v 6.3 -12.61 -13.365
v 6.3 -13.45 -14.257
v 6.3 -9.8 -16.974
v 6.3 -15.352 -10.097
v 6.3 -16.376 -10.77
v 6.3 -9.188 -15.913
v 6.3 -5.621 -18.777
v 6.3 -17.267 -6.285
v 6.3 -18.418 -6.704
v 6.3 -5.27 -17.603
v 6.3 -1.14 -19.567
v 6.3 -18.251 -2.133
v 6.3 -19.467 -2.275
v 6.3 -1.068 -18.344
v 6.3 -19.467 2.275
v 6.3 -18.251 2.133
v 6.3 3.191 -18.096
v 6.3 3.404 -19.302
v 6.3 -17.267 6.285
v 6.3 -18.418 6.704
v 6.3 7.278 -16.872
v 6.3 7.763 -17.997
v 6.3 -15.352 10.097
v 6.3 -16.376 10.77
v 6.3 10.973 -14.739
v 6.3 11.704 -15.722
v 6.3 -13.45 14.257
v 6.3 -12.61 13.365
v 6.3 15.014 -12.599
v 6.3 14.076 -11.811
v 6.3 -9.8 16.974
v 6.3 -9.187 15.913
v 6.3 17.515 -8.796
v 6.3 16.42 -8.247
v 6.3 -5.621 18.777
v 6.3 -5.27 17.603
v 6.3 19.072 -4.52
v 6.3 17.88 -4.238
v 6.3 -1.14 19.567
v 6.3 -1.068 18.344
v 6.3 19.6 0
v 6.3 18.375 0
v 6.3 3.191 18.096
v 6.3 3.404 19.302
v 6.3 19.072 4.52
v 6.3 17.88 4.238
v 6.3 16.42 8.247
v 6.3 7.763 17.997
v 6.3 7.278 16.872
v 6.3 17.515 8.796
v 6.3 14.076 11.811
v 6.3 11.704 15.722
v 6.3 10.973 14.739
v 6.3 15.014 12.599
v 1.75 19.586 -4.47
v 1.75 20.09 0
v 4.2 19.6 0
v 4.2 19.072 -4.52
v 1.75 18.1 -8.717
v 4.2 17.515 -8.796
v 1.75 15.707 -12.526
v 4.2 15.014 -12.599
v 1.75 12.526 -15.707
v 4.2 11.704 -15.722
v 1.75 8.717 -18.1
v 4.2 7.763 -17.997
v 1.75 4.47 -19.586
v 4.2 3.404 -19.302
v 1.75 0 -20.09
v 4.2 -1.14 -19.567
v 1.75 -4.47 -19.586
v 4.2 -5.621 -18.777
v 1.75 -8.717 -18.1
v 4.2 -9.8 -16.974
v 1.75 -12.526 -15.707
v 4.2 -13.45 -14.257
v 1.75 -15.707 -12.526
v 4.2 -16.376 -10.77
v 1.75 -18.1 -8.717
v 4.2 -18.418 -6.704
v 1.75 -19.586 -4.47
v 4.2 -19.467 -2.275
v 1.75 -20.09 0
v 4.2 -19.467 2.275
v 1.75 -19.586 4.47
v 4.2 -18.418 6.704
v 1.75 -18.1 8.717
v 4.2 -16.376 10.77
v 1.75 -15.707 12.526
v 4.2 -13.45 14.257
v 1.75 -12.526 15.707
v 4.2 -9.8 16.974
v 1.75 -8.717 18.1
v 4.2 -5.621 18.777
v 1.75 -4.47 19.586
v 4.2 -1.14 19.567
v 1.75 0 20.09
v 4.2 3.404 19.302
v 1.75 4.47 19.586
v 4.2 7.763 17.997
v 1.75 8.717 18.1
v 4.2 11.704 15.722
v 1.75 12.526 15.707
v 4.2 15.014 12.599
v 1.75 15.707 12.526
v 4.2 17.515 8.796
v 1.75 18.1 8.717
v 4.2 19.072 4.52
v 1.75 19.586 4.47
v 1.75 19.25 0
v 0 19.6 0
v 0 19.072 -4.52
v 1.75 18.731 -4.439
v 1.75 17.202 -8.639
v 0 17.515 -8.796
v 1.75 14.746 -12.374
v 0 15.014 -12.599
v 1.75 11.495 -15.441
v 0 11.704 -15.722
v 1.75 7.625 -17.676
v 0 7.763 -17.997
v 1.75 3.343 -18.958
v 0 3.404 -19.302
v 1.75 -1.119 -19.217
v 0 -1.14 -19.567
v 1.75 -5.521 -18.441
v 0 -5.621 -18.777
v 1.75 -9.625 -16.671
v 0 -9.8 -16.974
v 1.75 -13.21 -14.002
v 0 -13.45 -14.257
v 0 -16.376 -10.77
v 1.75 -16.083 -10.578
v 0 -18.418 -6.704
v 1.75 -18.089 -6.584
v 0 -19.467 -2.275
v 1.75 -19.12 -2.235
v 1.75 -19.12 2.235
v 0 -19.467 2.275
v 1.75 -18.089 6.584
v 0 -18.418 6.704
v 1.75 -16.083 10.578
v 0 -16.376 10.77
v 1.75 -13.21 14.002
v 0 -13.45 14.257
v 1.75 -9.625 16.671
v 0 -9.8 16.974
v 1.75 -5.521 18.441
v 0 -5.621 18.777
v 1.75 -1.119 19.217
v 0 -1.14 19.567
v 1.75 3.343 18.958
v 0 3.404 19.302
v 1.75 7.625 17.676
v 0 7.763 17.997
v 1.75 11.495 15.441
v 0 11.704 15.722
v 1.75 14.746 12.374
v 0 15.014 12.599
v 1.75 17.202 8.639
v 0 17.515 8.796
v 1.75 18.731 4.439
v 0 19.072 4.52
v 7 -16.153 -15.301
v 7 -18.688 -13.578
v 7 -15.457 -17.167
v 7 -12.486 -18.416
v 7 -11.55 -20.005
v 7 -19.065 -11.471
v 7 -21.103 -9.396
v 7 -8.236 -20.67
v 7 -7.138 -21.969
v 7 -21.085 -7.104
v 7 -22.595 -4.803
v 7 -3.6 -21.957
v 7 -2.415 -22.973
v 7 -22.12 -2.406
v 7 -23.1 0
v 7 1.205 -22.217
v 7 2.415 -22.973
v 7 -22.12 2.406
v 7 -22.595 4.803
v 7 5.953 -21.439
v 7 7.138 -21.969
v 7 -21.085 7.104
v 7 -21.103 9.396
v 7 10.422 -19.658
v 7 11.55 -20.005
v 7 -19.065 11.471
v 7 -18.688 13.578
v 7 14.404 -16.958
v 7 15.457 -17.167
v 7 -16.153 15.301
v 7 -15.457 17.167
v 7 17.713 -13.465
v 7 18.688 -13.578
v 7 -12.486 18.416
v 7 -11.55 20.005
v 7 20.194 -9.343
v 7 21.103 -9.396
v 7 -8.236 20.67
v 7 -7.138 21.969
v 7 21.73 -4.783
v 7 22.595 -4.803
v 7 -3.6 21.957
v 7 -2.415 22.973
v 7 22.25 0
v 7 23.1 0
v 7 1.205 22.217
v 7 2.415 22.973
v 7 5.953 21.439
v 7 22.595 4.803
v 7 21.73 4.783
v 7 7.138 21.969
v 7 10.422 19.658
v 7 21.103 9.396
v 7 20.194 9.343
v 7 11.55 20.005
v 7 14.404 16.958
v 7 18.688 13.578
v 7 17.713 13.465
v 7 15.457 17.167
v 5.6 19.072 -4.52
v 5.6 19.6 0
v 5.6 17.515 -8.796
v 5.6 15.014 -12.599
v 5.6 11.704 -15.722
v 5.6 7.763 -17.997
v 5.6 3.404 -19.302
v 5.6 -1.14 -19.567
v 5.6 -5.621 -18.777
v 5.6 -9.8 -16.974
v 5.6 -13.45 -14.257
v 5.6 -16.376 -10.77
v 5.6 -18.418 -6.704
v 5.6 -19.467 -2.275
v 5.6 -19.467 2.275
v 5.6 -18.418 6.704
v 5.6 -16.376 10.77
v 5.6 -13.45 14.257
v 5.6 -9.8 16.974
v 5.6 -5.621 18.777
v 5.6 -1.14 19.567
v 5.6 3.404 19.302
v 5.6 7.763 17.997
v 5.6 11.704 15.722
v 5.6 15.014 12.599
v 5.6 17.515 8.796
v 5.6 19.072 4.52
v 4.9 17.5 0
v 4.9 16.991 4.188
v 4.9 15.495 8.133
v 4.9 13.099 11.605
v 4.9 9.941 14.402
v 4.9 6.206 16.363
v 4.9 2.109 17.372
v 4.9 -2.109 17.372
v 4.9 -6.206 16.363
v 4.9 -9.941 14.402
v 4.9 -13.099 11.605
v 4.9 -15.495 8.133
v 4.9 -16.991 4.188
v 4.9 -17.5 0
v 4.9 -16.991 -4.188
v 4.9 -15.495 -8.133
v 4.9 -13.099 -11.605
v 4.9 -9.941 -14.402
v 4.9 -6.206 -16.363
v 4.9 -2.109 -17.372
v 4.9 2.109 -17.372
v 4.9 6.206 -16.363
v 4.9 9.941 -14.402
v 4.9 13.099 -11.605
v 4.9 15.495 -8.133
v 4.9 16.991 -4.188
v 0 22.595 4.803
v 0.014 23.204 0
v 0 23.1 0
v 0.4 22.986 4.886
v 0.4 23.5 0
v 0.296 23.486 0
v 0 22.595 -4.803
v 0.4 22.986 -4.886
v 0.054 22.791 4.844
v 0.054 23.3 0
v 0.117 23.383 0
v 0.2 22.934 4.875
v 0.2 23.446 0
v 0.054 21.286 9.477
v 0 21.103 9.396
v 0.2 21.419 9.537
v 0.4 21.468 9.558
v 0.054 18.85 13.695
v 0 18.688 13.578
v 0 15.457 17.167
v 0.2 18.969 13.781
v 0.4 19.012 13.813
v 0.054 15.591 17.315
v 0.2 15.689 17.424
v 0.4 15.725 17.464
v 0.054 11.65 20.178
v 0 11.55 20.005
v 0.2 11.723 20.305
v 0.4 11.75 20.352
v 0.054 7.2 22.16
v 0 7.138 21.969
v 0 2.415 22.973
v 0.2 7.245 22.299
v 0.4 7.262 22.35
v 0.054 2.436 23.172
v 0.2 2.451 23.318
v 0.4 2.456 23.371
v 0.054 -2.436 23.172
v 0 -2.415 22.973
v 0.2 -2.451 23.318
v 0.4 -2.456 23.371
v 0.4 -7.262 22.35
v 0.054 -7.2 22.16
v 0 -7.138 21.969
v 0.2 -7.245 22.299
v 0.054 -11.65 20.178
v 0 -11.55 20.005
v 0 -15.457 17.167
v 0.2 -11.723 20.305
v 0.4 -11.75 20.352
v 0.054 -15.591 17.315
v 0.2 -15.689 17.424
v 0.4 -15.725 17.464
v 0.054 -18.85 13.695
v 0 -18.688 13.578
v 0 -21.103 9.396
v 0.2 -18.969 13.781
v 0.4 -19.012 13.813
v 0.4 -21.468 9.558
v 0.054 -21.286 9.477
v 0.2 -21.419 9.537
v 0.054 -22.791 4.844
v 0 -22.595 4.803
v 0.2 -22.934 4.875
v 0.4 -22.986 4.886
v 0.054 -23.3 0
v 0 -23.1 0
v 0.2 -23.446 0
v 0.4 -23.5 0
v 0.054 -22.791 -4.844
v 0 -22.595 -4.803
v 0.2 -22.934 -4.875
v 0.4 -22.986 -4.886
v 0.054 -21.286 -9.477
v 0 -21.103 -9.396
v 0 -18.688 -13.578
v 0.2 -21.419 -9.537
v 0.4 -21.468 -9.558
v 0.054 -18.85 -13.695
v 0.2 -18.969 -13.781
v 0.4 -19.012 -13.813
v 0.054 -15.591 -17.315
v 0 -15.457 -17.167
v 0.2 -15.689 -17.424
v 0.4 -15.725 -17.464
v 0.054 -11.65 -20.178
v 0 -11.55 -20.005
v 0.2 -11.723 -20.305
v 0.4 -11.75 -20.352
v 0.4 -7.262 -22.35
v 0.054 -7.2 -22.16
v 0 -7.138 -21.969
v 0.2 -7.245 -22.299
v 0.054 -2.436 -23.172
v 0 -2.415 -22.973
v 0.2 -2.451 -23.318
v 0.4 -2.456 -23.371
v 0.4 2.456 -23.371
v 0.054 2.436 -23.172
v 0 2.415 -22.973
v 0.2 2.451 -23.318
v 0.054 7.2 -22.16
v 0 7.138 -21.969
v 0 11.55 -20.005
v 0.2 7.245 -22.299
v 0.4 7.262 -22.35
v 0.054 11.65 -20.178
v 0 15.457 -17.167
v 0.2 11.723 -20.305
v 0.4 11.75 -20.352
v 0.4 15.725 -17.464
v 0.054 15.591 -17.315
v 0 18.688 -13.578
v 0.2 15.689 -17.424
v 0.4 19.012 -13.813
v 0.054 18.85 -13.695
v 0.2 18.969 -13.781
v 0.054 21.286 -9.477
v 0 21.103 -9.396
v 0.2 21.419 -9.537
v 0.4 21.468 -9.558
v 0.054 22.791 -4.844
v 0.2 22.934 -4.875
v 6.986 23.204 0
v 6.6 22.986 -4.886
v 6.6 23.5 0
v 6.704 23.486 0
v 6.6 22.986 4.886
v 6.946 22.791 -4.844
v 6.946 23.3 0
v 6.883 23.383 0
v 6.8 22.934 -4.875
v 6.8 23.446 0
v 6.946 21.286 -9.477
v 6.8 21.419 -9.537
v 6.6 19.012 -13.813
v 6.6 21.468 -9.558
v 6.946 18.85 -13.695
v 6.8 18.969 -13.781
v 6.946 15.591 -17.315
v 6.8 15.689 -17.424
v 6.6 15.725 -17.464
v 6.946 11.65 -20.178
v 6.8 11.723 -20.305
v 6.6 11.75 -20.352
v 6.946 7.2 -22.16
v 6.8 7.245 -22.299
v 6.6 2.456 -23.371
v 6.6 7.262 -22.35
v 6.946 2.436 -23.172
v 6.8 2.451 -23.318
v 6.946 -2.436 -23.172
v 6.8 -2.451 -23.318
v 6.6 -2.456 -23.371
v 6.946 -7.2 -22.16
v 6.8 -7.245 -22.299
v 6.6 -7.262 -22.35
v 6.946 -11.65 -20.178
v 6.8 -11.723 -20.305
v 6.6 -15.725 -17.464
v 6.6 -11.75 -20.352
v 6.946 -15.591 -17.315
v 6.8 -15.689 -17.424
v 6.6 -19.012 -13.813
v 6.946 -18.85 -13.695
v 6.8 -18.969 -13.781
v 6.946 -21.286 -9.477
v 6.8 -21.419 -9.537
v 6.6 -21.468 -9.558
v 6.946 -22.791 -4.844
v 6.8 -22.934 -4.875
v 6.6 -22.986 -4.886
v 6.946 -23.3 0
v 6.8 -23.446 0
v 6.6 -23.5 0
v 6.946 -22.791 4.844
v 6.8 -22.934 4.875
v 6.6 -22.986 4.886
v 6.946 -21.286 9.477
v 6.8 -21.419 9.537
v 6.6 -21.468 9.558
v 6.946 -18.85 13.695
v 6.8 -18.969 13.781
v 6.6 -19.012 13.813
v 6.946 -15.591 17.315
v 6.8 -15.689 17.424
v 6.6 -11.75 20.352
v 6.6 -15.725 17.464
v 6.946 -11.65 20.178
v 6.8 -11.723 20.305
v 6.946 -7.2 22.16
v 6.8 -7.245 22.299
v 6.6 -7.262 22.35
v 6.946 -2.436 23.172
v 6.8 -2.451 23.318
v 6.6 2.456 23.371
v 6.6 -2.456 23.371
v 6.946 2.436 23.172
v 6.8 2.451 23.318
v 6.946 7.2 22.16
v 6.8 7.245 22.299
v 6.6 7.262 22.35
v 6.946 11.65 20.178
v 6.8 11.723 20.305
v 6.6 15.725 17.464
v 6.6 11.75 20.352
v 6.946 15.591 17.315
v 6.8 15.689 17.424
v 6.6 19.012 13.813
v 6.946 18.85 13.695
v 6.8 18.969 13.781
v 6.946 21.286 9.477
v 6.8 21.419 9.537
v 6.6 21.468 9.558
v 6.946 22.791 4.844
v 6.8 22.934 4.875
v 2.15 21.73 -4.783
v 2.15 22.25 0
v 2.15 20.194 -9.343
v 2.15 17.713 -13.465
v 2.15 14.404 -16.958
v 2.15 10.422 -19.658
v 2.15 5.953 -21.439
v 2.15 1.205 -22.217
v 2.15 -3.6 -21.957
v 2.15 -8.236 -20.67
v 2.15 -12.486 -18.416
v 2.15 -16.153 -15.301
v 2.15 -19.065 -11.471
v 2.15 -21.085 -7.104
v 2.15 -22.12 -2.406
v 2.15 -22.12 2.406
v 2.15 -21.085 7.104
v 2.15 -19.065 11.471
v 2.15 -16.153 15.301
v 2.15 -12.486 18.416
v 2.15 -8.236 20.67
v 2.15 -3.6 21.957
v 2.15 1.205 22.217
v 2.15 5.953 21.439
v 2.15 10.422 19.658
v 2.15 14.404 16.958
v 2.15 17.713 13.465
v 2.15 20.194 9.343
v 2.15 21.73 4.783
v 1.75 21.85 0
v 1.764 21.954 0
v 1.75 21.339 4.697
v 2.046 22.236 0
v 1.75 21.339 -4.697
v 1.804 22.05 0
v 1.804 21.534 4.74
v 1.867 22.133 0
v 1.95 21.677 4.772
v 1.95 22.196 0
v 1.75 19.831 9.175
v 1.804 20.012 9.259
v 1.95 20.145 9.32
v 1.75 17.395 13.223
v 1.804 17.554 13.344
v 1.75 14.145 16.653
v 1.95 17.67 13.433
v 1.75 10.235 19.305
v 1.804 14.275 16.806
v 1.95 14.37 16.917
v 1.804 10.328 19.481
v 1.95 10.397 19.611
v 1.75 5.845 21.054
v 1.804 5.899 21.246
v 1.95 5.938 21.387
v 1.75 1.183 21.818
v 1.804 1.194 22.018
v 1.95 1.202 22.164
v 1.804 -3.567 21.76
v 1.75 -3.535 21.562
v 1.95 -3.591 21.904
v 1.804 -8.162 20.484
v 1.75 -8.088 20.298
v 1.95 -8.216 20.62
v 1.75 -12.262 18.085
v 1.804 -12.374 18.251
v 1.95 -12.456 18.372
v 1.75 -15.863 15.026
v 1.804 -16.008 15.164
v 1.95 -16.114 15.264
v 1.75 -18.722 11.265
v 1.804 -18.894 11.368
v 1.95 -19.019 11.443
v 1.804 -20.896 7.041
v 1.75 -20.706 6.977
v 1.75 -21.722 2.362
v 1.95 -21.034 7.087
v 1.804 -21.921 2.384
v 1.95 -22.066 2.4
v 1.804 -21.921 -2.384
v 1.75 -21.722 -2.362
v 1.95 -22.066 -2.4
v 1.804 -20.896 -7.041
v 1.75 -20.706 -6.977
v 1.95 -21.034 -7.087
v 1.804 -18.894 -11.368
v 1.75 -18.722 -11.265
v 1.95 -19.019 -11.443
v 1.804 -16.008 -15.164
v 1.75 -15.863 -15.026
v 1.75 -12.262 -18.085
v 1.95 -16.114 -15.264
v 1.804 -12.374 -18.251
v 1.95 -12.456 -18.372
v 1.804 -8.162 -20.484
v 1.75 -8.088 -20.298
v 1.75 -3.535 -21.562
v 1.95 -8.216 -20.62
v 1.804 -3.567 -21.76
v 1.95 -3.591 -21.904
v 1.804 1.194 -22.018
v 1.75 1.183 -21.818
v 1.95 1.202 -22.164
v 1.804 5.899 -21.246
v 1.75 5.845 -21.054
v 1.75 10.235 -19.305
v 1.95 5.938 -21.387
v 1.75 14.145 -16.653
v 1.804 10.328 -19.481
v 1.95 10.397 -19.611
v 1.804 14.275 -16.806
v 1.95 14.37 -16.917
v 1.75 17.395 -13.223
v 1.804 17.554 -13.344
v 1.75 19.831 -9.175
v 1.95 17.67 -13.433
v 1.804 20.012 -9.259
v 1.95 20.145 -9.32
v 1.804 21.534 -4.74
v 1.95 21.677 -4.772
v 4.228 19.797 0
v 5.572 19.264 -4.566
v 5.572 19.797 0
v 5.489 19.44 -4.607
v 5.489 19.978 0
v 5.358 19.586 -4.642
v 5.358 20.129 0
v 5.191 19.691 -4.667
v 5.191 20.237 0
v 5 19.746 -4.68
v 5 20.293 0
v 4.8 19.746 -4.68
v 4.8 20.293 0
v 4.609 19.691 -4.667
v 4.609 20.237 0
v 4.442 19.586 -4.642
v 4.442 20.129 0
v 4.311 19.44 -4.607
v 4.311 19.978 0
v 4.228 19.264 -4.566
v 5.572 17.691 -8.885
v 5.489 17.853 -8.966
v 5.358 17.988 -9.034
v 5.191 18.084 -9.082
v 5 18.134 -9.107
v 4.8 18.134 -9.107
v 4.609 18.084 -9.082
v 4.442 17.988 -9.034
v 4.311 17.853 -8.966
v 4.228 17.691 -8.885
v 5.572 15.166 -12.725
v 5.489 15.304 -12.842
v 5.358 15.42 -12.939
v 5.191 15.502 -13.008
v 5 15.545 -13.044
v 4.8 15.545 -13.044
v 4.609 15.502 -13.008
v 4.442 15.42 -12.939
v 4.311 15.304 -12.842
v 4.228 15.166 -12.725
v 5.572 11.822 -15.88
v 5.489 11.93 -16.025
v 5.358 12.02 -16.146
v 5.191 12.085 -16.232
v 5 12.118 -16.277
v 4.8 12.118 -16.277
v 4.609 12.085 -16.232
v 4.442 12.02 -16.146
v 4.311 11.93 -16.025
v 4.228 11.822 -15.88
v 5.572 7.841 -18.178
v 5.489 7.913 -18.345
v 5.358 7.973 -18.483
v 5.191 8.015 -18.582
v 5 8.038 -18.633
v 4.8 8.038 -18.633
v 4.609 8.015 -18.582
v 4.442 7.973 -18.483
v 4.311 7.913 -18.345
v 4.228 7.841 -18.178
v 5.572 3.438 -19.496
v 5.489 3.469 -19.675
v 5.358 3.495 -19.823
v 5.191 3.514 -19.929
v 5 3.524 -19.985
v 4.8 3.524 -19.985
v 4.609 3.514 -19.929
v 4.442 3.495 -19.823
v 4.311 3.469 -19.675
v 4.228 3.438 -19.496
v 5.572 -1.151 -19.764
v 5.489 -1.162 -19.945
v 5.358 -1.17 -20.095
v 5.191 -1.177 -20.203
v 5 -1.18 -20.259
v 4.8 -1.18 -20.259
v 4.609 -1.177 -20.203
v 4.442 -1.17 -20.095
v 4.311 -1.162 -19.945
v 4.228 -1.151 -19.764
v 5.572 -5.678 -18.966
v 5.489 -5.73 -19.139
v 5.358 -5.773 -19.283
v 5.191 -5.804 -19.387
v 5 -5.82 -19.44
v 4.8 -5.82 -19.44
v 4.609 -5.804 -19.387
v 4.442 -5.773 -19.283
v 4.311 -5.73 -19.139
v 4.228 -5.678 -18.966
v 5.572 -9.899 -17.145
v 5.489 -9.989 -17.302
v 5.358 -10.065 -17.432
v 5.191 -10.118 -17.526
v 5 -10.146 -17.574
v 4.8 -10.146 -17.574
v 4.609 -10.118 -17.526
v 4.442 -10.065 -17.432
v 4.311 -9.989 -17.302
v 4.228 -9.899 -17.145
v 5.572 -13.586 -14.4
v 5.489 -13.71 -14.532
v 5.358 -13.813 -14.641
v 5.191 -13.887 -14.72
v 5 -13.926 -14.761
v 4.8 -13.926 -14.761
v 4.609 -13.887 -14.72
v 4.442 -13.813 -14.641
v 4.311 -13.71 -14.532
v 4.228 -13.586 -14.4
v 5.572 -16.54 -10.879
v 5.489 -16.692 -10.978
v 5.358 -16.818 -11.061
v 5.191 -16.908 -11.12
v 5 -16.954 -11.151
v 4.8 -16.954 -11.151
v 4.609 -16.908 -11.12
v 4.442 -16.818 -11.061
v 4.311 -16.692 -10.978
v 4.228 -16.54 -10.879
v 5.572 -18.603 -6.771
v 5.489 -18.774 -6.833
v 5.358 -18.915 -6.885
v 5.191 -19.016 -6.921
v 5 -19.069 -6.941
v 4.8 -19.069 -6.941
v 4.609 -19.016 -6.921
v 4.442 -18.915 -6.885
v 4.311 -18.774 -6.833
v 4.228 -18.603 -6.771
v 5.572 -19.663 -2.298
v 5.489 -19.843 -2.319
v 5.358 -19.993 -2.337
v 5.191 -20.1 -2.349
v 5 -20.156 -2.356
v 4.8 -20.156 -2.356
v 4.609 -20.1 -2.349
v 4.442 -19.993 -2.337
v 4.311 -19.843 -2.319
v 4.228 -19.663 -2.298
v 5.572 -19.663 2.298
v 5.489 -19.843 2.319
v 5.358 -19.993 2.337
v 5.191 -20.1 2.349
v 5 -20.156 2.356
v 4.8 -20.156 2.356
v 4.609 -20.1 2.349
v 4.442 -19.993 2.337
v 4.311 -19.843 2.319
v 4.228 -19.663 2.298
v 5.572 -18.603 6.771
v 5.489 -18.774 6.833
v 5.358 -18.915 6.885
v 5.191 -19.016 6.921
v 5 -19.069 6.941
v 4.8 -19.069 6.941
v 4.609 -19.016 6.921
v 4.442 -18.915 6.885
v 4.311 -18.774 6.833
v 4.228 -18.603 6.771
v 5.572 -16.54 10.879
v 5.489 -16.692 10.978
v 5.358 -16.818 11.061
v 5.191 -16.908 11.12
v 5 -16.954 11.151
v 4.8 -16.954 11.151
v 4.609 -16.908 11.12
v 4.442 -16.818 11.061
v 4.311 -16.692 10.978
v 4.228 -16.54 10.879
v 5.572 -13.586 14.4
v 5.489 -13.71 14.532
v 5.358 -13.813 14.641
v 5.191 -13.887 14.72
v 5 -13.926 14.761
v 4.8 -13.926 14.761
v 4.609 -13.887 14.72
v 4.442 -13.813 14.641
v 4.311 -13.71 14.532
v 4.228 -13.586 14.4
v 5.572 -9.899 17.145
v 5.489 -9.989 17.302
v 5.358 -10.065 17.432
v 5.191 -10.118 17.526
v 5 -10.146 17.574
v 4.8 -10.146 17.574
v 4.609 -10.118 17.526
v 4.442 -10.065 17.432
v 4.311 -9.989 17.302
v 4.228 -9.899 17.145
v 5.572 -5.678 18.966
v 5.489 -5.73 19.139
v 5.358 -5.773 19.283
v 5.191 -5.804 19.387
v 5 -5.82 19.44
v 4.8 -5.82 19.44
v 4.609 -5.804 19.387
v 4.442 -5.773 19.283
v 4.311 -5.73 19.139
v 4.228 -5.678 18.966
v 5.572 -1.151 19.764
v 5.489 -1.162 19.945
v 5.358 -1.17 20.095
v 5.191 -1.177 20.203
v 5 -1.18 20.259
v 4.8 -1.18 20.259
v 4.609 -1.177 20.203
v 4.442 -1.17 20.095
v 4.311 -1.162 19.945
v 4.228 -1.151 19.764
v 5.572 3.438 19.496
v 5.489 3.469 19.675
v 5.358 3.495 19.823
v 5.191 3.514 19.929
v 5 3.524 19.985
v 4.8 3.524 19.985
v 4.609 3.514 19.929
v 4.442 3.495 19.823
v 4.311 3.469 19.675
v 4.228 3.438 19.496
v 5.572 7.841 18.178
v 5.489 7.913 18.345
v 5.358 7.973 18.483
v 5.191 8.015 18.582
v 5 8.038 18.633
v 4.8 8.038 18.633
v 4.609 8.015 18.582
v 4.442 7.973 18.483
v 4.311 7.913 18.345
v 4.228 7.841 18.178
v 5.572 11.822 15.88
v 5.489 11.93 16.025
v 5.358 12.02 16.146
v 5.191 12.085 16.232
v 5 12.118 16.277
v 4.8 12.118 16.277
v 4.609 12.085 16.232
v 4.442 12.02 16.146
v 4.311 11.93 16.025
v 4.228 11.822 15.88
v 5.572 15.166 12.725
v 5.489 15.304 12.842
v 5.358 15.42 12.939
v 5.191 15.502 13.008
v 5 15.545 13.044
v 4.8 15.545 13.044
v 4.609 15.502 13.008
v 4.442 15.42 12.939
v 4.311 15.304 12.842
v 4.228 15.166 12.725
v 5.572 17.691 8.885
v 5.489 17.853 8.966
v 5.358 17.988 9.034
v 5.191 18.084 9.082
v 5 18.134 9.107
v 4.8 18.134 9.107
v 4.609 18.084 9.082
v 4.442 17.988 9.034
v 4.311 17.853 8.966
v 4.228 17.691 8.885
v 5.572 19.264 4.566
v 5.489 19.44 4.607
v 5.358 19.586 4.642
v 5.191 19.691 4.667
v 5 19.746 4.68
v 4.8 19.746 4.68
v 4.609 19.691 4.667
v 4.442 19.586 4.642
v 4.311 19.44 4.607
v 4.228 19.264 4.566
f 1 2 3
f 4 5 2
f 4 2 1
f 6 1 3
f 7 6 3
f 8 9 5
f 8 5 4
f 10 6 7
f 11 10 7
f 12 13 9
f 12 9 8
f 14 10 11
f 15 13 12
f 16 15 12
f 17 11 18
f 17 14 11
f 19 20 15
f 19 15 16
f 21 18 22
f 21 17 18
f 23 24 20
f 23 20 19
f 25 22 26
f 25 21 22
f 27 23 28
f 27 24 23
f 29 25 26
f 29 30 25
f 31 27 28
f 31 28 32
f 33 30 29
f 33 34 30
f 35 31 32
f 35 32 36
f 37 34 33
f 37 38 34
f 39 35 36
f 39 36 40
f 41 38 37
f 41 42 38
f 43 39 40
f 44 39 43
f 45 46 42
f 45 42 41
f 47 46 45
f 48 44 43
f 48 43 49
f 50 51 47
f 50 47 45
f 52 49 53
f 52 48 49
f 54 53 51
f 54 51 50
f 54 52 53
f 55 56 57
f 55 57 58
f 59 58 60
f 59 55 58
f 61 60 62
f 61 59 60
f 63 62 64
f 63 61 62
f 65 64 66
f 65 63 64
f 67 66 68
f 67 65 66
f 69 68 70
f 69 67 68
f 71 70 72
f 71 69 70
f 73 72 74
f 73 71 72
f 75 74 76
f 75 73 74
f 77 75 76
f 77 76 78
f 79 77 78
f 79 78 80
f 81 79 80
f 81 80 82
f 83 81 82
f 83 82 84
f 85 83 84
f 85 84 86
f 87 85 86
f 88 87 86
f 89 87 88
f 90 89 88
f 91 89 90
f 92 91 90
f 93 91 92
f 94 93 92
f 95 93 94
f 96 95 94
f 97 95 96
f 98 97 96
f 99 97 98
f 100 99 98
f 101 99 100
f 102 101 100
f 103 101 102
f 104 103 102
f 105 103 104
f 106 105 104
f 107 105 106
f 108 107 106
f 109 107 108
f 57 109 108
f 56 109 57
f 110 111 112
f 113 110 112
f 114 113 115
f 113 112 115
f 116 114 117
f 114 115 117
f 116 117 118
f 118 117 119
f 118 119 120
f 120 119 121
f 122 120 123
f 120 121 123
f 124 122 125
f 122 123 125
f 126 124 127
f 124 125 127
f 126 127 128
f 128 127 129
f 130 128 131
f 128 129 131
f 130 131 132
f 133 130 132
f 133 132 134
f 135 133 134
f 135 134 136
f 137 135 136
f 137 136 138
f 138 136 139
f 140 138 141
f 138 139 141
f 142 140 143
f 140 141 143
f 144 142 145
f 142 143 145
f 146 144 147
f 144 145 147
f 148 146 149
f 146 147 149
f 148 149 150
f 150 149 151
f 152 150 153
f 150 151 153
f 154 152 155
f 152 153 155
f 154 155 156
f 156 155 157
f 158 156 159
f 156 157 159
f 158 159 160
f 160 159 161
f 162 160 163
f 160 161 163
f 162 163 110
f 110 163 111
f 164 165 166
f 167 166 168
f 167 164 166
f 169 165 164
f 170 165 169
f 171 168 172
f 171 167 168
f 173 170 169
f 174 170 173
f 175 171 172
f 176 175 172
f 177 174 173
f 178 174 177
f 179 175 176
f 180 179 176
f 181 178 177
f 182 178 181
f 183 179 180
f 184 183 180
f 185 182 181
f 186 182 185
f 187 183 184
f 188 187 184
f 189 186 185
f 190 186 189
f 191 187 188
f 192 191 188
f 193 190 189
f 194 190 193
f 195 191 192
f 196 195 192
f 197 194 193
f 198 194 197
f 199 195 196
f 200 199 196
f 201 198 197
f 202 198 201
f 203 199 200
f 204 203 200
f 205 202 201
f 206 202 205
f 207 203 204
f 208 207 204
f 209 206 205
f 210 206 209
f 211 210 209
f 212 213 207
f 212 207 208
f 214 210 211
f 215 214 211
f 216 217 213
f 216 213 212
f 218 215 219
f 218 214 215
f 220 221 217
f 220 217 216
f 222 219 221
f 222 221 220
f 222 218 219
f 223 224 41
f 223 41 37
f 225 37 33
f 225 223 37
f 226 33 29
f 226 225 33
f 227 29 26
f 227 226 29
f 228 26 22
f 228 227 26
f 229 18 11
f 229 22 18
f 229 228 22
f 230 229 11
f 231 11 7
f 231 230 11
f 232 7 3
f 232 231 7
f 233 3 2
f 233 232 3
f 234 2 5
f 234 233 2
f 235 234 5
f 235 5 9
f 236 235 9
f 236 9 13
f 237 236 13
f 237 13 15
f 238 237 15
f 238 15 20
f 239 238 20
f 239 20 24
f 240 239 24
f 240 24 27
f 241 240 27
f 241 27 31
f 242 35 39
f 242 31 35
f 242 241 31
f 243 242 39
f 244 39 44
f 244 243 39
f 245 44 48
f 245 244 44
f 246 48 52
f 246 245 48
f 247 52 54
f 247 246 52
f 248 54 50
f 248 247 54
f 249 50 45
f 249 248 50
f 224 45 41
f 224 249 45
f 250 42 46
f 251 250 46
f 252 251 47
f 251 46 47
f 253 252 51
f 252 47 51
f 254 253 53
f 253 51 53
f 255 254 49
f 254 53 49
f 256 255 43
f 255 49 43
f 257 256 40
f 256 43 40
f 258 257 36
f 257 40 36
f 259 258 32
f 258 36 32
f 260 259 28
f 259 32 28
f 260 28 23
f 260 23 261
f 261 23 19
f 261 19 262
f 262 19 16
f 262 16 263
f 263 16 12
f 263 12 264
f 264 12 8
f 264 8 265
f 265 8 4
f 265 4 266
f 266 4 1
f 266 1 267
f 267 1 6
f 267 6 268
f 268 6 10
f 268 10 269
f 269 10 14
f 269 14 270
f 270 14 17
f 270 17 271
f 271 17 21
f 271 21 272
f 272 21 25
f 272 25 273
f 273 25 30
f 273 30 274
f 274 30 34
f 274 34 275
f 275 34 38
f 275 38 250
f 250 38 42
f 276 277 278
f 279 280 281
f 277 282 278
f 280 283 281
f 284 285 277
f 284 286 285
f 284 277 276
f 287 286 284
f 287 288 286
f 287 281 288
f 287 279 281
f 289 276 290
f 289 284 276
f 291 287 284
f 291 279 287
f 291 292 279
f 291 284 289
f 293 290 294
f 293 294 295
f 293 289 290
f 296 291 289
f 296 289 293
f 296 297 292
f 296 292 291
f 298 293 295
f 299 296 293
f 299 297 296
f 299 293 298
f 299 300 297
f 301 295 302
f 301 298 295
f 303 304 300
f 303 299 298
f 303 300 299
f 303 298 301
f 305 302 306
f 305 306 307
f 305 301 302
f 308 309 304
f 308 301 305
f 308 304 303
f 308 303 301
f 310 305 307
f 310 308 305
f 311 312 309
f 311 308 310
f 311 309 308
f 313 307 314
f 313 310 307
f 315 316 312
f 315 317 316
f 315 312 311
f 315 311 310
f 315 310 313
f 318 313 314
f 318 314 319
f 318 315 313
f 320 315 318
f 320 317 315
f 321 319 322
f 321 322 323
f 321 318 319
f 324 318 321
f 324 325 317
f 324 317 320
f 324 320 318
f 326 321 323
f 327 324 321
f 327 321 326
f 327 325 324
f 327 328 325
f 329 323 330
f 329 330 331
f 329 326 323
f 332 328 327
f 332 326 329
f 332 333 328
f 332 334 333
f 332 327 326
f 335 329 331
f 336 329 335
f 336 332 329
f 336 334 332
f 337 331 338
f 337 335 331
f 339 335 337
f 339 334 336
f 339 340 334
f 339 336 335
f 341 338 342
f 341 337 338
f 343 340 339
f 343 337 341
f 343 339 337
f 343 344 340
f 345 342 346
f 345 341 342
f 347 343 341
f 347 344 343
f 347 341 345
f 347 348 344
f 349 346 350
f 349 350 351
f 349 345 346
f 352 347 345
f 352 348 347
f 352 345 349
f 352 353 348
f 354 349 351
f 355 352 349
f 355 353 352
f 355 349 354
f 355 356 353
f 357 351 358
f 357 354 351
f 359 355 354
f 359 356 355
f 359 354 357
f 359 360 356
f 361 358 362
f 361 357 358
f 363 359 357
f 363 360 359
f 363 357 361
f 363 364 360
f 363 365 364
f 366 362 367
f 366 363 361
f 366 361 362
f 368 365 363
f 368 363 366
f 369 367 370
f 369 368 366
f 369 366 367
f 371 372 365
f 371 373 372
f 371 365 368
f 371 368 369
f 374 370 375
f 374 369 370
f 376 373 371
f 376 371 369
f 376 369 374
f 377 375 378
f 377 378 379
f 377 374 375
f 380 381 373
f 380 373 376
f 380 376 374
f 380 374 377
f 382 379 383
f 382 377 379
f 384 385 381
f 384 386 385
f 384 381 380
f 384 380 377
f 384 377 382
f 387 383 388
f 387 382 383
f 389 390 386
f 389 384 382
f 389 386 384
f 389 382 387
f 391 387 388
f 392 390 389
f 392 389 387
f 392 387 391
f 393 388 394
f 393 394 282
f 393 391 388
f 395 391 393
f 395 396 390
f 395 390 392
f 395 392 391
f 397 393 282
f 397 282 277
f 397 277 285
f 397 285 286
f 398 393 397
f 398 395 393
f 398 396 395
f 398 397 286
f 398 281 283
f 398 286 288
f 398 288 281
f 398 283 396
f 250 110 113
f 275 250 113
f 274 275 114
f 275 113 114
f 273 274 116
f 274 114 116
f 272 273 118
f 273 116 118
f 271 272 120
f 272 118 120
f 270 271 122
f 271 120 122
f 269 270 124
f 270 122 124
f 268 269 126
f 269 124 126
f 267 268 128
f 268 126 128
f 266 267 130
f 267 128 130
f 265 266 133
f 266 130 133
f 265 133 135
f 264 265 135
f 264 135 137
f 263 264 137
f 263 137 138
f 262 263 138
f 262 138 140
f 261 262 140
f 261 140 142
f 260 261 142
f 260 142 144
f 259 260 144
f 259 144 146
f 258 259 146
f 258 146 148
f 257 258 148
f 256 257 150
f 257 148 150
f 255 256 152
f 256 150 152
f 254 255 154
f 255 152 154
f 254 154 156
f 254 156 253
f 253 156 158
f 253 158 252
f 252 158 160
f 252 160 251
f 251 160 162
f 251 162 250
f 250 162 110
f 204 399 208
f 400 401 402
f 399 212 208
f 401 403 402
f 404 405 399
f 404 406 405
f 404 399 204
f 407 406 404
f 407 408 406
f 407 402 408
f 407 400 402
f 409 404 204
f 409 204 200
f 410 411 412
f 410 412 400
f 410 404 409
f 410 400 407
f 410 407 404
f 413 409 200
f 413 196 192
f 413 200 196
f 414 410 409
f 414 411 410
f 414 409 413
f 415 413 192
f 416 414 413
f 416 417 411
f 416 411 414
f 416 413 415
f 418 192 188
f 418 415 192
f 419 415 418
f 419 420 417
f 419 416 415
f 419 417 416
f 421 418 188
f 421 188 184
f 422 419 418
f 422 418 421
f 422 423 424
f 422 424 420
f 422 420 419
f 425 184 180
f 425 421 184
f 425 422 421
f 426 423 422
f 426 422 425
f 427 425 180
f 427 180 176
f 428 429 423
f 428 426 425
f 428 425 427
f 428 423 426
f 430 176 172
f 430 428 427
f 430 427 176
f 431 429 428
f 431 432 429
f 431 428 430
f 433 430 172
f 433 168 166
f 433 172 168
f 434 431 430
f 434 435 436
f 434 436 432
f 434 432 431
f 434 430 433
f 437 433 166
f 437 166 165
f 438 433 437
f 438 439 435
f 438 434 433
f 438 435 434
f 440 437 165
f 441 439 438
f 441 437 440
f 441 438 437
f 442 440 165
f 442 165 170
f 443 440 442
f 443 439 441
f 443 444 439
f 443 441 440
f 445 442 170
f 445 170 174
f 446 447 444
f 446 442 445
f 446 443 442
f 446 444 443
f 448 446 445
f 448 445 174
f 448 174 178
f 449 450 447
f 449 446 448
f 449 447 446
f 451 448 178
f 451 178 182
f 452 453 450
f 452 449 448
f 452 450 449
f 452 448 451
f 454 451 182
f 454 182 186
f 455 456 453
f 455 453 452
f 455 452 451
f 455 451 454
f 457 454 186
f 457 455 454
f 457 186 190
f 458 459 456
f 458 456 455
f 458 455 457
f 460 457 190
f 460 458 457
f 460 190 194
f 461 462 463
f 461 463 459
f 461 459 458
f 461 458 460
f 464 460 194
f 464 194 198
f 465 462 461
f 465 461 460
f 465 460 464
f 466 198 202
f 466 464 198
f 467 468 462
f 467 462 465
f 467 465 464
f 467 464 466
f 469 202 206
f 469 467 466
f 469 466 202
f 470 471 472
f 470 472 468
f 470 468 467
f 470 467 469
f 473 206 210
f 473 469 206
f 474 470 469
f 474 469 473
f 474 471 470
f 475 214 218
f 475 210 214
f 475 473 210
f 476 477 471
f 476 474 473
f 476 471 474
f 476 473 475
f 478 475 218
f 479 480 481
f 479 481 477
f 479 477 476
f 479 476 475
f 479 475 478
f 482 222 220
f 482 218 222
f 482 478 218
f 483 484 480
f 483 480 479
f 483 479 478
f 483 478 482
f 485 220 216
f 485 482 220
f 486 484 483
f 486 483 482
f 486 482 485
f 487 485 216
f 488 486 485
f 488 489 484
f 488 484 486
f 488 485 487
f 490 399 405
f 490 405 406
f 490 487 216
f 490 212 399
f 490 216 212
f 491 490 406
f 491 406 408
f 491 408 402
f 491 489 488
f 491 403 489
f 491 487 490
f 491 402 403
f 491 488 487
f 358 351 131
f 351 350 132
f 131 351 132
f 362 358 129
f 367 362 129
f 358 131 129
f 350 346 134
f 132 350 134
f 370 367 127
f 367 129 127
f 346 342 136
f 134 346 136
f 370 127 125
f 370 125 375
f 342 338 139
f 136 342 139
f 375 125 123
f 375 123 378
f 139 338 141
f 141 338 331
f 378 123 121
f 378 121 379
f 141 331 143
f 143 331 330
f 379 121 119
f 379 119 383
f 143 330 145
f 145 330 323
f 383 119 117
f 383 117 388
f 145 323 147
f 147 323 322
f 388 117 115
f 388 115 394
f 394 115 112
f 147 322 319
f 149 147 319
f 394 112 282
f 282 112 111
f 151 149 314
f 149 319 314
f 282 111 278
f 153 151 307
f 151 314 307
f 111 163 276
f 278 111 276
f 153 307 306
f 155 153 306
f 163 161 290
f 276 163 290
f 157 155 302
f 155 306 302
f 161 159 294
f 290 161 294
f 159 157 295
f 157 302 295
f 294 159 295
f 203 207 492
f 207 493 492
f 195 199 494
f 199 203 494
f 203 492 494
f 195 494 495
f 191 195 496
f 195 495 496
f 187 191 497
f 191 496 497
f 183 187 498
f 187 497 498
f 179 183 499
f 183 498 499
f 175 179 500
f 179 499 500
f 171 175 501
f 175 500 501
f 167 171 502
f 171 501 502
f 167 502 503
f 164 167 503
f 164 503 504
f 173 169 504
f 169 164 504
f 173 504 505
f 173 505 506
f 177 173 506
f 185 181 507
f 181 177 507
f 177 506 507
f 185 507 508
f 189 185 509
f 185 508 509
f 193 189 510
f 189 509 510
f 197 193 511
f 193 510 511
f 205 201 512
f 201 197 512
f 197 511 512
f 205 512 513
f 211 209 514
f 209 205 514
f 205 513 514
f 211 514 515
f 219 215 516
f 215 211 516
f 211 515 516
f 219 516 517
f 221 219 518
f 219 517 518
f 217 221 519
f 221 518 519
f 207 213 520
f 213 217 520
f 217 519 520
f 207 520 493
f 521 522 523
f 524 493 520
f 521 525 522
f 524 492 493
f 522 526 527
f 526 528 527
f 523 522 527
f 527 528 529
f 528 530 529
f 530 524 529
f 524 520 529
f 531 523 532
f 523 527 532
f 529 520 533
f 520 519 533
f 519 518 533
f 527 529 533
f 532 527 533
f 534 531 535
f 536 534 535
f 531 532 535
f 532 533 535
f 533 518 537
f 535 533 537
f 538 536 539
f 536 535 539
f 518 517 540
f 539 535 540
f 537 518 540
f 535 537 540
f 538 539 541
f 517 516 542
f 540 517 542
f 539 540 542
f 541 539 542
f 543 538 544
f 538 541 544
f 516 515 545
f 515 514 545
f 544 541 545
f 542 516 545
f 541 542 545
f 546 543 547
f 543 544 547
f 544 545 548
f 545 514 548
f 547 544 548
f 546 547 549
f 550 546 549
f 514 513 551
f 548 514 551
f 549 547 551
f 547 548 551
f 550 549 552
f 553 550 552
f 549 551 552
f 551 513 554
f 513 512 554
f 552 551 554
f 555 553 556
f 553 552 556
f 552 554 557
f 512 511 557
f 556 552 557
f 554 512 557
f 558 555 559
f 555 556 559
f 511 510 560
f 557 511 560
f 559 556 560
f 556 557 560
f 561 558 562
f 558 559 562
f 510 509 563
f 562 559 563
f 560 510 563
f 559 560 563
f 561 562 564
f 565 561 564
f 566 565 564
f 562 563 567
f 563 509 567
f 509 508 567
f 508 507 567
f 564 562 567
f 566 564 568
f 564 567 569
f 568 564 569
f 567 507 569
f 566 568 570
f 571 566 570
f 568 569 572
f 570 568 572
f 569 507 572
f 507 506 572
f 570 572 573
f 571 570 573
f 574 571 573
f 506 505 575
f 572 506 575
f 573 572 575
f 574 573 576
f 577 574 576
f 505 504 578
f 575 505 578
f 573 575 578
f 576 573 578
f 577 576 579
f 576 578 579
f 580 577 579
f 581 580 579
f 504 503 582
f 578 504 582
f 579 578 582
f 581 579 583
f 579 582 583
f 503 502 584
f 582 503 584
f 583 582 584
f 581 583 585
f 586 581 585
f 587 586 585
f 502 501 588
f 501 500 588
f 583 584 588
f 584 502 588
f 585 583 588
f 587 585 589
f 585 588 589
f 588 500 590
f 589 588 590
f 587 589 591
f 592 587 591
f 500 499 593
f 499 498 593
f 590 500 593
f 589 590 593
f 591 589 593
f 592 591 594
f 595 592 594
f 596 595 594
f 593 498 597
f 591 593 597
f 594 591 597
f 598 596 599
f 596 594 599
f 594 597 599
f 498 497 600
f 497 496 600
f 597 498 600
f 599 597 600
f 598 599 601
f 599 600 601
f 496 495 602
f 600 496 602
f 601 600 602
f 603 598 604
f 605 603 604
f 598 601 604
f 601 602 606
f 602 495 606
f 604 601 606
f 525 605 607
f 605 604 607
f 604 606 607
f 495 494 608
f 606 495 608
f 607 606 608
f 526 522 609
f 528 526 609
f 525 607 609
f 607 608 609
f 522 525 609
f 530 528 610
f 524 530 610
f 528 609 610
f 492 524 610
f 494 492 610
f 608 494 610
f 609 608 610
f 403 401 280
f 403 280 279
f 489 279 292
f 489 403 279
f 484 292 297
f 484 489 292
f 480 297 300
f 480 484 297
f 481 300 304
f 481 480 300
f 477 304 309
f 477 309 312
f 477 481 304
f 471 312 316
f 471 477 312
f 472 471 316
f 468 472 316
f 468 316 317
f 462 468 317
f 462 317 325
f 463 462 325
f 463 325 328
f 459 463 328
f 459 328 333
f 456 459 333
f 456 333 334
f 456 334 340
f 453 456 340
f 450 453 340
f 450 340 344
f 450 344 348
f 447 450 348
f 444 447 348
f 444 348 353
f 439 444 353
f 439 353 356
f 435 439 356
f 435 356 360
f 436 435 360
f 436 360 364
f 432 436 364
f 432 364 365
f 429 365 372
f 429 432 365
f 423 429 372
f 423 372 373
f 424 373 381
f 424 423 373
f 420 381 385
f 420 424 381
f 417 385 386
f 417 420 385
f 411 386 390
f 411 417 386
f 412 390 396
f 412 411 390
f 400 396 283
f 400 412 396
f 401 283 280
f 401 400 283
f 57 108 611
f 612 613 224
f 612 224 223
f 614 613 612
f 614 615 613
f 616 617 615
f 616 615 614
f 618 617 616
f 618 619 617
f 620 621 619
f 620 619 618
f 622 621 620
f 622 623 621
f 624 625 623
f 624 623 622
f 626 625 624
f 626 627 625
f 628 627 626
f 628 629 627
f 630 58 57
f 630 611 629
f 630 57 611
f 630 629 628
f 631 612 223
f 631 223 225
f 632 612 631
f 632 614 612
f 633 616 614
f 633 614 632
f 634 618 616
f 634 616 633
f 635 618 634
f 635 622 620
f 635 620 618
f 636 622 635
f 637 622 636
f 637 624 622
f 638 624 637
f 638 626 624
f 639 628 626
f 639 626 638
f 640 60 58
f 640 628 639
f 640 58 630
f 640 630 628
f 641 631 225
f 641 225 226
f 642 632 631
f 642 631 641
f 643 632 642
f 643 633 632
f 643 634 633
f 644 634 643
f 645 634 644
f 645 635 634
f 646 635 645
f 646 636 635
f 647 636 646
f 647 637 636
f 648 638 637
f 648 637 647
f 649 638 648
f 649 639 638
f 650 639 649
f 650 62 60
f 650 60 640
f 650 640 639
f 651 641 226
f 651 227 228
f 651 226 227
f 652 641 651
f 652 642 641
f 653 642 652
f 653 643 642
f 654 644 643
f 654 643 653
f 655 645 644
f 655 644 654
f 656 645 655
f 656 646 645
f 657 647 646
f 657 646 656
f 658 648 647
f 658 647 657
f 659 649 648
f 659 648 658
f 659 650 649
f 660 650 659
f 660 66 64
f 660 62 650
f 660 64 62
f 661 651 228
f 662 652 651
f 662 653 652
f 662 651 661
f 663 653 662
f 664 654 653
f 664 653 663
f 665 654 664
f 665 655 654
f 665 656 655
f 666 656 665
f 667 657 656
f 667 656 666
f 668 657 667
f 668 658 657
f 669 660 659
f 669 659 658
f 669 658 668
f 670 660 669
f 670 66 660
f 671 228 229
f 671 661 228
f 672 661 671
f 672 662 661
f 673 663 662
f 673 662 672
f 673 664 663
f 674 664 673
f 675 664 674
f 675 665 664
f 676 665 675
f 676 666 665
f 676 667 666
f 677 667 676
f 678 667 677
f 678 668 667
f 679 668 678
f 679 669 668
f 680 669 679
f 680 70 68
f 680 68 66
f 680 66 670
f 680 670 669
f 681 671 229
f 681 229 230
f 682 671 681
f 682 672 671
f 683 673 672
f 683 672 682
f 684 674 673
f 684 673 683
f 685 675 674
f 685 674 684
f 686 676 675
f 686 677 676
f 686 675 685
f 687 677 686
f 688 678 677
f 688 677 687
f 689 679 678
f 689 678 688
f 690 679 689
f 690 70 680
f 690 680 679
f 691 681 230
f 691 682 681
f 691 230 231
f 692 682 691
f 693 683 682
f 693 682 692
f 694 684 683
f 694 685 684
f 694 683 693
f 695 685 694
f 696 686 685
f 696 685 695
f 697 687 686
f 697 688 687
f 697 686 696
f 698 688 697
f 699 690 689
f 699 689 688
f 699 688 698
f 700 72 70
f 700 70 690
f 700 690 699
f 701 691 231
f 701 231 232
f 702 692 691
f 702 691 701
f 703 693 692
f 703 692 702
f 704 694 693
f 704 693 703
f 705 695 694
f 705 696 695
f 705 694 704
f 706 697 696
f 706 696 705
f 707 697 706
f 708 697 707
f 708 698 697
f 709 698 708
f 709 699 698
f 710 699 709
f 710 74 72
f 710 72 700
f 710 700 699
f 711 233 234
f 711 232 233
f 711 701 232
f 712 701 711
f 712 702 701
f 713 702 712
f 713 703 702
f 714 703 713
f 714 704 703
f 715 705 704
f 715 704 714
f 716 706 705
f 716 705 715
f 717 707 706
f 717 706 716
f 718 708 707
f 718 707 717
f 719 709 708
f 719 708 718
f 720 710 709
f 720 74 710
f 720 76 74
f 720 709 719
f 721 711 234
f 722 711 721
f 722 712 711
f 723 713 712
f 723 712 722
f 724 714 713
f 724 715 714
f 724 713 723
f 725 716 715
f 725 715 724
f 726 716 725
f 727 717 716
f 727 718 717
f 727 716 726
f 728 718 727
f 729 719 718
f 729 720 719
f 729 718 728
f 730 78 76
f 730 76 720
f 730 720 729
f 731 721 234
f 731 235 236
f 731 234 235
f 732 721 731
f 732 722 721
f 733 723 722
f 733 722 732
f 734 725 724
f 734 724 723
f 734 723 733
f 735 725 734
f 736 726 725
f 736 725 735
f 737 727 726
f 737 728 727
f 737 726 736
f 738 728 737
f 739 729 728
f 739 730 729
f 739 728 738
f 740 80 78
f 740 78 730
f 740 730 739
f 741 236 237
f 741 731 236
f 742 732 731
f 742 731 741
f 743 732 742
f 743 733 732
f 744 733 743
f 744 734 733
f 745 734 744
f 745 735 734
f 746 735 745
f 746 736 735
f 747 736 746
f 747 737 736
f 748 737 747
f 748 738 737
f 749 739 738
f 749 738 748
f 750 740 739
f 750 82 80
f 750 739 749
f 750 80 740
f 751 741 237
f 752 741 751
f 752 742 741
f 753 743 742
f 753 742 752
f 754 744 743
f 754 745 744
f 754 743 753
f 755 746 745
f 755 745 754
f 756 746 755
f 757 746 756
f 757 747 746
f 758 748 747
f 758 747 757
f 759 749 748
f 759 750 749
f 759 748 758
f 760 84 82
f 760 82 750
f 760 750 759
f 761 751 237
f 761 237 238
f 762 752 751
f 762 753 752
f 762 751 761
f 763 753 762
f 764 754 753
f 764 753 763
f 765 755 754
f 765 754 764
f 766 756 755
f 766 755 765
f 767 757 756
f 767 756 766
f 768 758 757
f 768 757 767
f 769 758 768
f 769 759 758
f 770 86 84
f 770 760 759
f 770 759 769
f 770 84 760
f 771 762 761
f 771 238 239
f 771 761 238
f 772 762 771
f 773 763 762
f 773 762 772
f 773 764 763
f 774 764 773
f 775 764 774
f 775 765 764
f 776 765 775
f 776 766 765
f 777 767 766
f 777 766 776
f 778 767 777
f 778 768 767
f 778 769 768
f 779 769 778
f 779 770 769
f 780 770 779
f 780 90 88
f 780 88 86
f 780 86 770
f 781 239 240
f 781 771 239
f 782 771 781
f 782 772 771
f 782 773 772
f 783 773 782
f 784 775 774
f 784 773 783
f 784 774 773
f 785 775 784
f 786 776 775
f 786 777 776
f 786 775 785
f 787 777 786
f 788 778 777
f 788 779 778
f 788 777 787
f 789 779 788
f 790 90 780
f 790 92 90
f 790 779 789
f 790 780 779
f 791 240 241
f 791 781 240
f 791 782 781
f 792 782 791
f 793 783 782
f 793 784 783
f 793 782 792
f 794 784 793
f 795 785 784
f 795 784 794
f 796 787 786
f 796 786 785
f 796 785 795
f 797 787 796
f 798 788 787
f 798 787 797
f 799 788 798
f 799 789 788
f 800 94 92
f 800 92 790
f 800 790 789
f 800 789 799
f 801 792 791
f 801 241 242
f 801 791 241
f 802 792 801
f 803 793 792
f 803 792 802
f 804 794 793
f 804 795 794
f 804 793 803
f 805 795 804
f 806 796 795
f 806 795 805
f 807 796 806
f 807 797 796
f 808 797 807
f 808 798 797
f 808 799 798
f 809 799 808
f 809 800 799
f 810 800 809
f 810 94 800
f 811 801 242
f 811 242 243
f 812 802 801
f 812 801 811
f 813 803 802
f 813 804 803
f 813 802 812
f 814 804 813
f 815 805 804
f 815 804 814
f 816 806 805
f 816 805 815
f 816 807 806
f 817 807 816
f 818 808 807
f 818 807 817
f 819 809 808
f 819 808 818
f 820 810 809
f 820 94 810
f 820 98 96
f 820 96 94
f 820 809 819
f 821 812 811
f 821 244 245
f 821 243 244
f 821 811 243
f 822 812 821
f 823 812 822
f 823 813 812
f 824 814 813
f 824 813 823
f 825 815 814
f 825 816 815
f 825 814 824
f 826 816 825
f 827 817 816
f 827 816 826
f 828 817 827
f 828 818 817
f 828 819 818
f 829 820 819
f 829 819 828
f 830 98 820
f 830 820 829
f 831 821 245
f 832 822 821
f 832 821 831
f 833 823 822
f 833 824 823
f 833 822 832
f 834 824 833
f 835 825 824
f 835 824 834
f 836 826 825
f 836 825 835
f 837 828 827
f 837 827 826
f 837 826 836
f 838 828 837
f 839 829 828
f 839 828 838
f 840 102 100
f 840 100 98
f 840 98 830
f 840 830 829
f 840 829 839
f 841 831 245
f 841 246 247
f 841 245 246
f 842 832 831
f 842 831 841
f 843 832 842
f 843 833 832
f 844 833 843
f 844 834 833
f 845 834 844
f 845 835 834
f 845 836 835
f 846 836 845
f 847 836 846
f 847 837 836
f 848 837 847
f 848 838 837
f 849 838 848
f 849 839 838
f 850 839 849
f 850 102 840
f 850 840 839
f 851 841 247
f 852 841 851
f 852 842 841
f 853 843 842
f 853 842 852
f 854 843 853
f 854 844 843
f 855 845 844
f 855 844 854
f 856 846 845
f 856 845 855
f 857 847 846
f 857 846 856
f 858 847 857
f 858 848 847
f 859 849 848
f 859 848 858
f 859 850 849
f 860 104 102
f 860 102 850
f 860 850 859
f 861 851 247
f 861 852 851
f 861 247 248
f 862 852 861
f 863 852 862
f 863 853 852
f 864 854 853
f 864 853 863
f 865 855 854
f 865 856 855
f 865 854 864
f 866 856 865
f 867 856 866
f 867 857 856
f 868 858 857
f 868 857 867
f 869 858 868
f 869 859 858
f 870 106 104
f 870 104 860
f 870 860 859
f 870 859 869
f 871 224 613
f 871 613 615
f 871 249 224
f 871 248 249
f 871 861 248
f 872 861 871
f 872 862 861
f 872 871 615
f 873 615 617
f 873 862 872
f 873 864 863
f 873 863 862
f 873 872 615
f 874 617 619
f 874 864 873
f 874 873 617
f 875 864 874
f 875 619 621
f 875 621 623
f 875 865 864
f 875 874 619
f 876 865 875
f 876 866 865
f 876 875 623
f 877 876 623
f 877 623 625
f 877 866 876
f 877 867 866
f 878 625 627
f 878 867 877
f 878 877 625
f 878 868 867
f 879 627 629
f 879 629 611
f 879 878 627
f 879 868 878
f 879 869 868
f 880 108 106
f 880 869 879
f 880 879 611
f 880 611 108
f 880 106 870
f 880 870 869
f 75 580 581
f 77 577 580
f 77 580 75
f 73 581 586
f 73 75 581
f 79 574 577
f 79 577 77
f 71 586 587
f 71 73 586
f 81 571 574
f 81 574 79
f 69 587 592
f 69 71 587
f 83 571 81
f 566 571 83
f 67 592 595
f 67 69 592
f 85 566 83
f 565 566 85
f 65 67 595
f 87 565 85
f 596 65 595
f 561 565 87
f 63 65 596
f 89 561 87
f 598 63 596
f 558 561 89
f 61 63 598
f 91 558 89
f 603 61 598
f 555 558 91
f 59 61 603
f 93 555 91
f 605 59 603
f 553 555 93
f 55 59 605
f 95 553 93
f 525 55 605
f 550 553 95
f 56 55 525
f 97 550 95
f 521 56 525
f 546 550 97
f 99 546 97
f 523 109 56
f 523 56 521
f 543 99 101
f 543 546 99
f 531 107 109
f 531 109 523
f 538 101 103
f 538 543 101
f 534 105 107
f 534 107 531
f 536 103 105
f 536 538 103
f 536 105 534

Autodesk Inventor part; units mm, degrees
ref_plane "YZ Plane" through (0, 0, 0) normal (1, 0, 0) x (0, 1, 0)
ref_plane "XZ Plane" through (0, 0, 0) normal (0, 1, 0) x (-1, 0, 0)
ref_plane "XY Plane" through (0, 0, 0) normal (0, 0, 1) x (1, 0, 0)
sketch "Skizze1" plane through (0, 0, 0) normal (0, 0, 1) x (1, 0, 0)
  circle A0 centre (4.9, 19.6) radius 0.455
  circle A1 centre (4.9, 19.6) radius 0.7
  line L0 (6.3, 18.375) -> (6.3, 19.6)
  line L1 (0, 23.5) -> (7, 23.5)
  line L2 (7, 23.5) -> (7, 22.25)
  line L3 (7, 22.25) -> (1.75, 22.25)
  line L4 (0, 0) -> (9.5856, 0)
  line L5 (0, 23.5) -> (0, 19.6)
  line L6 (0, 19.6) -> (1.75, 19.25)
  line L7 (1.75, 19.25) -> (4.9, 17.5)
  line L8 (4.9, 17.5) -> (6.3, 18.375)
  line L9 (4.9, 17.5) -> (0, 17.5) construction
  line L10 (0, 18) -> (0, -3) projected
  line L11 (-1.9171, 0) -> (11.5027, 0) projected
  line L12 (4.2, 19.6) -> (1.75, 20.09)
  line L13 (1.75, 20.09) -> (1.75, 22.25)
  line L14 (6.3, 19.6) -> (5.6, 19.6)
  dimension "d0" = 47
  dimension "d1" = 36.75
  dimension "d2" = 1.25
  dimension "d3" = 0.91
  dimension "d4" = 1.4
  dimension "d5" = 35
  dimension "d6" = 38.5
  dimension "d7" = 39.2
  dimension "d8" = 4.9
  dimension "d9" = 6.3
  dimension "d10" = 7
  dimension "d12" = 1.75
revolve "Körper" add sketch "Skizze1" angle 360 about axis through (0, 0, 0) along (1, 0, 0) contours L14 L0 L8 L7 L6 L5 L1 L2 L3 L13 L12 A1
revolve "Feder1" add sketch "Skizze1" angle 360 about axis through (0, 0, 0) along (1, 0, 0) contours A0 | A1
fillet "Rundung1" radius 0.4 3 edges at (7, -23.5, 0) (1.75, -22.25, 0) (0, -23.5, 0)
equation "\"d0\" = SD2"
equation "\"d1\" = ABDM"
equation "\"d3\" = SPDI"
equation "\"d4\" = SPDA"
equation "\"d5\" = NND"
equation "\"d6\" = TKDM"
equation "\"d7\" = HLDM"
equation "\"d8\" = SPDST"
equation "\"d9\" = SDI"
equation "\"d10\" = SWDT"
equation "\"d12\" = SD"
equation "\"d11\" = RR"
equation "\"SD2\" = 47"
equation "\"SWDT\" = 7"
equation "\"RR\" = 0.4"
equation "\"SD\" = 1.75"
equation "\"NND\" = 35"
equation "\"SPDA\" = 1.4"
equation "\"SPDI\" = 0.91"
equation "\"TKDM\" = 38.5"
equation "\"HLDM\" = 39.2"
equation "\"ABDM\" = 36.75"
equation "\"SDI\" = 6.3"
equation "\"SPDST\" = 4.9"
equation "\"LAB\" = 0.35"
properties part number "DIN 3760 - A - 35 x 47 x 7 - NBR" material "Gummi"
